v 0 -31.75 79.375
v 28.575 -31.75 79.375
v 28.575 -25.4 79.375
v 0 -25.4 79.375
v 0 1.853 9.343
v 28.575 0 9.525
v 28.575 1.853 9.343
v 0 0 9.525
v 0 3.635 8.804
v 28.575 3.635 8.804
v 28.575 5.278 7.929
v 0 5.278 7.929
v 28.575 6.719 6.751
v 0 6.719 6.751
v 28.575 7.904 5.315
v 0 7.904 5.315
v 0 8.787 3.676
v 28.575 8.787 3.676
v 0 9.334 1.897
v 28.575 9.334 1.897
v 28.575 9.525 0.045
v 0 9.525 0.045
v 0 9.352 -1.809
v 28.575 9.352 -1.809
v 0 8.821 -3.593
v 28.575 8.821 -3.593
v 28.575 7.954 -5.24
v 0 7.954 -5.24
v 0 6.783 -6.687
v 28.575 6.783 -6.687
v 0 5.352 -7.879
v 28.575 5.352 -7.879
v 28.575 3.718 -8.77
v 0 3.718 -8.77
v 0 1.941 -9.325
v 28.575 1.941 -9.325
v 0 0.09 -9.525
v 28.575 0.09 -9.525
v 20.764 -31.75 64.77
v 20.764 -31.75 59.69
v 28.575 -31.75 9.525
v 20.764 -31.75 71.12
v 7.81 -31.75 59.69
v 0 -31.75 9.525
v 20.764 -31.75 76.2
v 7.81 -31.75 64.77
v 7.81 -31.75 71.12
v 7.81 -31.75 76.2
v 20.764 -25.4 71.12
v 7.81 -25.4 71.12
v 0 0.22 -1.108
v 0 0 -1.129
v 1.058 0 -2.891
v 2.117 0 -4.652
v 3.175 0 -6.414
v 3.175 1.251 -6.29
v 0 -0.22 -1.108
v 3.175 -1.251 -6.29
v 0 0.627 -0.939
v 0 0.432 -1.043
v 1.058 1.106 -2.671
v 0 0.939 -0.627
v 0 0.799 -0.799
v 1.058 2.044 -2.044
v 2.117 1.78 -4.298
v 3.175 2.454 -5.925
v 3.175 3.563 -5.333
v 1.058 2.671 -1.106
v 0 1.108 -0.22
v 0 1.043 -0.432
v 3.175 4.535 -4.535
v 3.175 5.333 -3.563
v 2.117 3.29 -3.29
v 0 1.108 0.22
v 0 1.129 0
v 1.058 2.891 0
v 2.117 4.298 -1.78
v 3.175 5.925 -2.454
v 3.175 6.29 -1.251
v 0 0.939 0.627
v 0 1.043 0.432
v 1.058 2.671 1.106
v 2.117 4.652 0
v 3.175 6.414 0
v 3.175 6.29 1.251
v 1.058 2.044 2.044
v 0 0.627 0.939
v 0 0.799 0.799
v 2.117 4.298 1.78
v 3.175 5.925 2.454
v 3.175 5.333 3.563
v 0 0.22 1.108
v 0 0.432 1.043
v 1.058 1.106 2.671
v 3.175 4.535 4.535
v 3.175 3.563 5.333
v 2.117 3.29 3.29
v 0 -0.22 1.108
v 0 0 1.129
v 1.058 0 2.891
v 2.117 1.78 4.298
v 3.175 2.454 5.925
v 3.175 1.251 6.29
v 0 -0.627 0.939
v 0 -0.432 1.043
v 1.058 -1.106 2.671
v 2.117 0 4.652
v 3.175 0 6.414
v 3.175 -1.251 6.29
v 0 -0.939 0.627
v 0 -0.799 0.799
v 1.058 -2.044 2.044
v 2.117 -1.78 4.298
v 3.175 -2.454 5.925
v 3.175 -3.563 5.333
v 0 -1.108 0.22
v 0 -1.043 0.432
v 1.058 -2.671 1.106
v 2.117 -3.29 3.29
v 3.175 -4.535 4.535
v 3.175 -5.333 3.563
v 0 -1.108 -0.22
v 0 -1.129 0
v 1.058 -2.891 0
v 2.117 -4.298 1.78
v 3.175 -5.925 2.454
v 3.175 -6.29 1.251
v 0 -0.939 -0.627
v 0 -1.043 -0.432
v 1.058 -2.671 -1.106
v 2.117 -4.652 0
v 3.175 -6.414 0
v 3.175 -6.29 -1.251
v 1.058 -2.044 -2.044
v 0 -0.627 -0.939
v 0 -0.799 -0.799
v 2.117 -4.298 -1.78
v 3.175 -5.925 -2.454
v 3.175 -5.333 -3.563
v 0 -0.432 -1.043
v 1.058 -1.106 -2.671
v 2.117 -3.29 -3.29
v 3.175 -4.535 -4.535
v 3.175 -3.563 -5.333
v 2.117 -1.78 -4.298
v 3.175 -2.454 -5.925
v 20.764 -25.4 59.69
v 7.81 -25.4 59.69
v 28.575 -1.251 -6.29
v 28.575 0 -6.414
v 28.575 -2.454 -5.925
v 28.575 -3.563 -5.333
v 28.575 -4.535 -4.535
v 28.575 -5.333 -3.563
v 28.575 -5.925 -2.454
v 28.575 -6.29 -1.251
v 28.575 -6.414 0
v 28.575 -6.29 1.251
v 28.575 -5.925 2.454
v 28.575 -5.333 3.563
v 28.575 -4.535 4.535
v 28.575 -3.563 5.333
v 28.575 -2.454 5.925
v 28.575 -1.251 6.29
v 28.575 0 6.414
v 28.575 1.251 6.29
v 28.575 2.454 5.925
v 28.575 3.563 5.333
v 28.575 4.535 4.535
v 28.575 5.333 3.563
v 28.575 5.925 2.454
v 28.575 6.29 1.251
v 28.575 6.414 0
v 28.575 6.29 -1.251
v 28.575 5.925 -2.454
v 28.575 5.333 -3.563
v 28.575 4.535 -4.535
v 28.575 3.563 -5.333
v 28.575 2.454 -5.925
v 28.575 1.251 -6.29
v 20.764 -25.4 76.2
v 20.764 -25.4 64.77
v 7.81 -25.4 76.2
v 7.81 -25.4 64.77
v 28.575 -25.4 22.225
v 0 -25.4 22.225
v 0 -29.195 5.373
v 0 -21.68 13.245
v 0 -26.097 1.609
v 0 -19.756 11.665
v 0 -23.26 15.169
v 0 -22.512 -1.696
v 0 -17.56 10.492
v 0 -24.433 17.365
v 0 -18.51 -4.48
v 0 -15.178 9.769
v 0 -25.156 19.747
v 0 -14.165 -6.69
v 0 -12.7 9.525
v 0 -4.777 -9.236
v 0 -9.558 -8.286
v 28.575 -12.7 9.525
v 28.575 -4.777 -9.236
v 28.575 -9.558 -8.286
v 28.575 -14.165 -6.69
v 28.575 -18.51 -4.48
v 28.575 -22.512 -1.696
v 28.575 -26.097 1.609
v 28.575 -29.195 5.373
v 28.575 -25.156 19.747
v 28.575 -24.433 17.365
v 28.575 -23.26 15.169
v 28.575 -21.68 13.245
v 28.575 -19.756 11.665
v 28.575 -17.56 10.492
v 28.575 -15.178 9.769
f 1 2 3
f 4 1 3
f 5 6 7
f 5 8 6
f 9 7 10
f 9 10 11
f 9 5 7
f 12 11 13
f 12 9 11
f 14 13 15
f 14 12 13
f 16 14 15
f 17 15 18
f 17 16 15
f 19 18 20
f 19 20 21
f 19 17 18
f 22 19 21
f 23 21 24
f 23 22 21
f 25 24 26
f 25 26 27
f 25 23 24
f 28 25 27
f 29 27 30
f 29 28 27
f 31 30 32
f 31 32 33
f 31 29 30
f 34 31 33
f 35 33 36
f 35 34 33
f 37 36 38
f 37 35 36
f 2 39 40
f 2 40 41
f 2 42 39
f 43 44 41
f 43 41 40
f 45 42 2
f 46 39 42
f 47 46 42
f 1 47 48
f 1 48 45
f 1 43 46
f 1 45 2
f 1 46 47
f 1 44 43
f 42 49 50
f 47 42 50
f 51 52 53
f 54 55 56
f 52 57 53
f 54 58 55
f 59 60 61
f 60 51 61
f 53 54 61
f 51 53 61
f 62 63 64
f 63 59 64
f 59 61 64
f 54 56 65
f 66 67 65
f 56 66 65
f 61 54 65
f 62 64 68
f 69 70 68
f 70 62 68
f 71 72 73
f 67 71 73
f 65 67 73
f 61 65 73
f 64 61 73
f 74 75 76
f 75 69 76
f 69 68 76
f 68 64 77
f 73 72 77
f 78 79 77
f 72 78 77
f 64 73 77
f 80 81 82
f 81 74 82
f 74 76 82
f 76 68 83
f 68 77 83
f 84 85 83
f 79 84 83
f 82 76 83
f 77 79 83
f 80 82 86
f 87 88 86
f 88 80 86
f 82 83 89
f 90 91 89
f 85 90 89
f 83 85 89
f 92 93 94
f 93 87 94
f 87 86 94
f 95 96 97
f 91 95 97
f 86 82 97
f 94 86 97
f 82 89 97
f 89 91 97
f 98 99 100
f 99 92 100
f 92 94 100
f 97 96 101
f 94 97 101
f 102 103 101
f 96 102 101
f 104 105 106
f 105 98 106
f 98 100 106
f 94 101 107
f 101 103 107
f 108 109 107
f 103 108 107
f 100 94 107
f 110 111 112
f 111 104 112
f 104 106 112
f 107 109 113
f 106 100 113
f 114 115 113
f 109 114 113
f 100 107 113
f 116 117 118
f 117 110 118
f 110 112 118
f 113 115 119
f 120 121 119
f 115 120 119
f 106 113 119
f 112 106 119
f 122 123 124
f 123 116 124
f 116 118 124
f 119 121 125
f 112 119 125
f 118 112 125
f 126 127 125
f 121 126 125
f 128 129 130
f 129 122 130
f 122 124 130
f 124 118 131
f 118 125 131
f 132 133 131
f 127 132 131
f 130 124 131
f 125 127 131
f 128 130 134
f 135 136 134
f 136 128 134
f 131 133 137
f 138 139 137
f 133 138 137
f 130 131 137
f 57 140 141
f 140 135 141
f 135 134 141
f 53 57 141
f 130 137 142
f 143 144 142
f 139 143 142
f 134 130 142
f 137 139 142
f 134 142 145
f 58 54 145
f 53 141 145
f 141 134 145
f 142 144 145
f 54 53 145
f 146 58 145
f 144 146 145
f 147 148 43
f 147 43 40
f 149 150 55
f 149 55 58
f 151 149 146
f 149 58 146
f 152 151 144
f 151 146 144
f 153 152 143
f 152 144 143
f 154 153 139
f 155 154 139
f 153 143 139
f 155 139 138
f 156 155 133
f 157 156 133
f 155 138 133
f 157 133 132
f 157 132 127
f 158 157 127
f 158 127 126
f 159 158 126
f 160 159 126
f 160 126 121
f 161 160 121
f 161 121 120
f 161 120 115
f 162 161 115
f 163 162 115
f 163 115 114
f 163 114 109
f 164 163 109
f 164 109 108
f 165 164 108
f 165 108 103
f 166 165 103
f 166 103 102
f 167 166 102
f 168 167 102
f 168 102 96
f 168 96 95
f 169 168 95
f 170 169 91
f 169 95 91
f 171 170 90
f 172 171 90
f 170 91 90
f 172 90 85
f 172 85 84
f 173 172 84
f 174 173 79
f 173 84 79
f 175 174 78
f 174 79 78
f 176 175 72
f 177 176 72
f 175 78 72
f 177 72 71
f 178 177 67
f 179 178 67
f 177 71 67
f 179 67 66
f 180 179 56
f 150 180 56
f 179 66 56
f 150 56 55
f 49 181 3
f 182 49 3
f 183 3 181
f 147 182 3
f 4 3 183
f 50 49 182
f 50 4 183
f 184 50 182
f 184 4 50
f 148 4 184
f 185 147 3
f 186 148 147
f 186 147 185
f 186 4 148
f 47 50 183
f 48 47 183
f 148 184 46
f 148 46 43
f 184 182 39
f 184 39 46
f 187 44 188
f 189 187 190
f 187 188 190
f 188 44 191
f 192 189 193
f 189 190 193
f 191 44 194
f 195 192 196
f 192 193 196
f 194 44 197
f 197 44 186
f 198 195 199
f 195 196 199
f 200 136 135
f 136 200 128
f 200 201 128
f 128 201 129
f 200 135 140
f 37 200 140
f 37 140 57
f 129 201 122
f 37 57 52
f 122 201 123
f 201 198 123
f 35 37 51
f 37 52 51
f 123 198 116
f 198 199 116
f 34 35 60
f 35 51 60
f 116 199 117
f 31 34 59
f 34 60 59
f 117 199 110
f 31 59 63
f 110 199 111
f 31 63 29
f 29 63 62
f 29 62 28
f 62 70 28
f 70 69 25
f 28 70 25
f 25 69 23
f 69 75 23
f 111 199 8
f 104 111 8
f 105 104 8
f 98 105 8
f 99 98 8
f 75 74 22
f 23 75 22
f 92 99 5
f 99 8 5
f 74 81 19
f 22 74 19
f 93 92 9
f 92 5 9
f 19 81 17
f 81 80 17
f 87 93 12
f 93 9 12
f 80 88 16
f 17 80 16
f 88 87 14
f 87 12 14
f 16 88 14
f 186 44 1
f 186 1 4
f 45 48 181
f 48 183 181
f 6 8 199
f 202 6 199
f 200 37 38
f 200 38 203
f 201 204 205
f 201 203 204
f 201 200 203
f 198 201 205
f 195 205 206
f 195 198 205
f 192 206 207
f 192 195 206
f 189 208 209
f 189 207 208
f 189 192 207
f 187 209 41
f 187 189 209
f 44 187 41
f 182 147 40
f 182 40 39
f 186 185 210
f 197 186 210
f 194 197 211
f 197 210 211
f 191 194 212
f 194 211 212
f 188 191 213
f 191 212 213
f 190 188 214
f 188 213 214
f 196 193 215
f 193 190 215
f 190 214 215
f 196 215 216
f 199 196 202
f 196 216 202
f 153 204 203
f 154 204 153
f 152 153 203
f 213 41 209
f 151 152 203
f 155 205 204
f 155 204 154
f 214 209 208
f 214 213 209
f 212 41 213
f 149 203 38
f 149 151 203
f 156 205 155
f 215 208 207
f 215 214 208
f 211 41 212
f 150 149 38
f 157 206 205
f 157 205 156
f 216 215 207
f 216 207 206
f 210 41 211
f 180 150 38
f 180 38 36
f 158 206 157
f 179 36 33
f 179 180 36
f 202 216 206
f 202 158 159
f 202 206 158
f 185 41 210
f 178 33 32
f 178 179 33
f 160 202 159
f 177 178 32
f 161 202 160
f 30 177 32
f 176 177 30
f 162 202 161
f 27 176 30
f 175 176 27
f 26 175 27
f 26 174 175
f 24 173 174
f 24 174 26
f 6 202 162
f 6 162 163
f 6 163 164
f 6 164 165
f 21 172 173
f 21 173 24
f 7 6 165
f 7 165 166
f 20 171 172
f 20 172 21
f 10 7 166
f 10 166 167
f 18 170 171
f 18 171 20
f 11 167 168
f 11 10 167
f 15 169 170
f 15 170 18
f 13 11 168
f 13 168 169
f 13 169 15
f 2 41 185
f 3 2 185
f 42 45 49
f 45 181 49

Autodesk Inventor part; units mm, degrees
ref_plane "YZ Plane" through (0, 0, 0) normal (1, 0, 0) x (0, 1, 0)
ref_plane "XZ Plane" through (0, 0, 0) normal (0, 1, 0) x (-1, 0, 0)
ref_plane "XY Plane" through (0, 0, 0) normal (0, 0, 1) x (1, 0, 0)
sketch "Sketch1" plane through (0, 0, 0) normal (1, 0, 0) x (0, 1, 0)
  circle A0 centre (0, 0) radius 9.525
  line L0 (0, 9.525) -> (-25.4, 9.525)
  line L1 (-31.75, 9.525) -> (-31.75, 79.375)
  line L2 (-31.75, 79.375) -> (-25.4, 79.375)
  line L3 (-25.4, 79.375) -> (-25.4, 9.525)
  arc A1 (-31.75, 9.525) -> (0.0899, -9.5246) centre (-0.2457, 26.0482) ccw
  dimension "d0" = 19.05
  dimension "d4" = 25.4
  dimension "d5" = 69.85
  dimension "d6" = 6.35
extrude "Extrusion1" add sketch "Sketch1" along normal blind 28.575
fillet "Fillet1" radius 12.7 1 edges at (14.2875, -25.4, 9.525)
sketch "Sketch2" plane through (28.575, 0, 0) normal (1, 0, 0) x (0, 0, -1)
  line L0 (-9.525, 0) -> (-9.525, -12.7) projected
  arc A0 (-22.225, -25.4) -> (-9.525, -12.7) centre (-22.225, -12.7) ccw projected
  line L1 (-22.225, -25.4) -> (-79.375, -25.4) projected
  line L2 (-79.375, -25.4) -> (-79.375, -31.75) projected
  line L3 (-79.375, -31.75) -> (-9.525, -31.75) projected
  arc A1 (-9.525, -31.75) -> (9.5246, 0.0899) centre (-26.0482, -0.2457) ccw projected
  arc A2 (9.5246, 0.0899) -> (-9.525, 0) centre (0, 0) ccw projected
hole "Hole1" at (28.575, 0, 0) direction (-1, 0, 0) diameter 12.827 depth 25.4 tip angle 118
sketch "Sketch3" plane through (0, -25.4, 79.375) normal (0, 1, 0) x (1, 0, 0)
  line L0 (0, 57.15) -> (28.575, 57.15) projected
  line L1 (0, 57.15) -> (0, 0) projected
  line L2 (0, 0) -> (28.575, 0) projected
  line L3 (28.575, 57.15) -> (28.575, 0) projected
  line L4 (7.8105, 3.175) -> (20.7645, 3.175)
  line L5 (20.7645, 3.175) -> (20.7645, 8.255)
  line L6 (20.7645, 8.255) -> (7.8105, 8.255)
  line L7 (7.8105, 8.255) -> (7.8105, 3.175)
  line L8 (7.8105, 19.685) -> (20.7645, 19.685)
  line L9 (20.7645, 19.685) -> (20.7645, 14.605)
  line L10 (20.7645, 14.605) -> (7.8105, 14.605)
  line L11 (7.8105, 14.605) -> (7.8105, 19.685)
  point P0 (0, 79.375)
  dimension "d17" = 12.954
  dimension "d18" = 5.08
  dimension "d19" = 7.8105
  dimension "d20" = 28.575
  dimension "d21" = 3.175
  dimension "d22" = 5.08
  dimension "d23" = 6.35
  dimension "d24" = 12.954
extrude "Extrusion2" cut sketch "Sketch3" against normal blind 25.4 contours L7 L6 L5 L4 | L8 L9 L10 L11
equation "\"d19\" = -0.5 * d17 + 0.5 * d20"
properties part number "WheelIntakeBase3.0"
